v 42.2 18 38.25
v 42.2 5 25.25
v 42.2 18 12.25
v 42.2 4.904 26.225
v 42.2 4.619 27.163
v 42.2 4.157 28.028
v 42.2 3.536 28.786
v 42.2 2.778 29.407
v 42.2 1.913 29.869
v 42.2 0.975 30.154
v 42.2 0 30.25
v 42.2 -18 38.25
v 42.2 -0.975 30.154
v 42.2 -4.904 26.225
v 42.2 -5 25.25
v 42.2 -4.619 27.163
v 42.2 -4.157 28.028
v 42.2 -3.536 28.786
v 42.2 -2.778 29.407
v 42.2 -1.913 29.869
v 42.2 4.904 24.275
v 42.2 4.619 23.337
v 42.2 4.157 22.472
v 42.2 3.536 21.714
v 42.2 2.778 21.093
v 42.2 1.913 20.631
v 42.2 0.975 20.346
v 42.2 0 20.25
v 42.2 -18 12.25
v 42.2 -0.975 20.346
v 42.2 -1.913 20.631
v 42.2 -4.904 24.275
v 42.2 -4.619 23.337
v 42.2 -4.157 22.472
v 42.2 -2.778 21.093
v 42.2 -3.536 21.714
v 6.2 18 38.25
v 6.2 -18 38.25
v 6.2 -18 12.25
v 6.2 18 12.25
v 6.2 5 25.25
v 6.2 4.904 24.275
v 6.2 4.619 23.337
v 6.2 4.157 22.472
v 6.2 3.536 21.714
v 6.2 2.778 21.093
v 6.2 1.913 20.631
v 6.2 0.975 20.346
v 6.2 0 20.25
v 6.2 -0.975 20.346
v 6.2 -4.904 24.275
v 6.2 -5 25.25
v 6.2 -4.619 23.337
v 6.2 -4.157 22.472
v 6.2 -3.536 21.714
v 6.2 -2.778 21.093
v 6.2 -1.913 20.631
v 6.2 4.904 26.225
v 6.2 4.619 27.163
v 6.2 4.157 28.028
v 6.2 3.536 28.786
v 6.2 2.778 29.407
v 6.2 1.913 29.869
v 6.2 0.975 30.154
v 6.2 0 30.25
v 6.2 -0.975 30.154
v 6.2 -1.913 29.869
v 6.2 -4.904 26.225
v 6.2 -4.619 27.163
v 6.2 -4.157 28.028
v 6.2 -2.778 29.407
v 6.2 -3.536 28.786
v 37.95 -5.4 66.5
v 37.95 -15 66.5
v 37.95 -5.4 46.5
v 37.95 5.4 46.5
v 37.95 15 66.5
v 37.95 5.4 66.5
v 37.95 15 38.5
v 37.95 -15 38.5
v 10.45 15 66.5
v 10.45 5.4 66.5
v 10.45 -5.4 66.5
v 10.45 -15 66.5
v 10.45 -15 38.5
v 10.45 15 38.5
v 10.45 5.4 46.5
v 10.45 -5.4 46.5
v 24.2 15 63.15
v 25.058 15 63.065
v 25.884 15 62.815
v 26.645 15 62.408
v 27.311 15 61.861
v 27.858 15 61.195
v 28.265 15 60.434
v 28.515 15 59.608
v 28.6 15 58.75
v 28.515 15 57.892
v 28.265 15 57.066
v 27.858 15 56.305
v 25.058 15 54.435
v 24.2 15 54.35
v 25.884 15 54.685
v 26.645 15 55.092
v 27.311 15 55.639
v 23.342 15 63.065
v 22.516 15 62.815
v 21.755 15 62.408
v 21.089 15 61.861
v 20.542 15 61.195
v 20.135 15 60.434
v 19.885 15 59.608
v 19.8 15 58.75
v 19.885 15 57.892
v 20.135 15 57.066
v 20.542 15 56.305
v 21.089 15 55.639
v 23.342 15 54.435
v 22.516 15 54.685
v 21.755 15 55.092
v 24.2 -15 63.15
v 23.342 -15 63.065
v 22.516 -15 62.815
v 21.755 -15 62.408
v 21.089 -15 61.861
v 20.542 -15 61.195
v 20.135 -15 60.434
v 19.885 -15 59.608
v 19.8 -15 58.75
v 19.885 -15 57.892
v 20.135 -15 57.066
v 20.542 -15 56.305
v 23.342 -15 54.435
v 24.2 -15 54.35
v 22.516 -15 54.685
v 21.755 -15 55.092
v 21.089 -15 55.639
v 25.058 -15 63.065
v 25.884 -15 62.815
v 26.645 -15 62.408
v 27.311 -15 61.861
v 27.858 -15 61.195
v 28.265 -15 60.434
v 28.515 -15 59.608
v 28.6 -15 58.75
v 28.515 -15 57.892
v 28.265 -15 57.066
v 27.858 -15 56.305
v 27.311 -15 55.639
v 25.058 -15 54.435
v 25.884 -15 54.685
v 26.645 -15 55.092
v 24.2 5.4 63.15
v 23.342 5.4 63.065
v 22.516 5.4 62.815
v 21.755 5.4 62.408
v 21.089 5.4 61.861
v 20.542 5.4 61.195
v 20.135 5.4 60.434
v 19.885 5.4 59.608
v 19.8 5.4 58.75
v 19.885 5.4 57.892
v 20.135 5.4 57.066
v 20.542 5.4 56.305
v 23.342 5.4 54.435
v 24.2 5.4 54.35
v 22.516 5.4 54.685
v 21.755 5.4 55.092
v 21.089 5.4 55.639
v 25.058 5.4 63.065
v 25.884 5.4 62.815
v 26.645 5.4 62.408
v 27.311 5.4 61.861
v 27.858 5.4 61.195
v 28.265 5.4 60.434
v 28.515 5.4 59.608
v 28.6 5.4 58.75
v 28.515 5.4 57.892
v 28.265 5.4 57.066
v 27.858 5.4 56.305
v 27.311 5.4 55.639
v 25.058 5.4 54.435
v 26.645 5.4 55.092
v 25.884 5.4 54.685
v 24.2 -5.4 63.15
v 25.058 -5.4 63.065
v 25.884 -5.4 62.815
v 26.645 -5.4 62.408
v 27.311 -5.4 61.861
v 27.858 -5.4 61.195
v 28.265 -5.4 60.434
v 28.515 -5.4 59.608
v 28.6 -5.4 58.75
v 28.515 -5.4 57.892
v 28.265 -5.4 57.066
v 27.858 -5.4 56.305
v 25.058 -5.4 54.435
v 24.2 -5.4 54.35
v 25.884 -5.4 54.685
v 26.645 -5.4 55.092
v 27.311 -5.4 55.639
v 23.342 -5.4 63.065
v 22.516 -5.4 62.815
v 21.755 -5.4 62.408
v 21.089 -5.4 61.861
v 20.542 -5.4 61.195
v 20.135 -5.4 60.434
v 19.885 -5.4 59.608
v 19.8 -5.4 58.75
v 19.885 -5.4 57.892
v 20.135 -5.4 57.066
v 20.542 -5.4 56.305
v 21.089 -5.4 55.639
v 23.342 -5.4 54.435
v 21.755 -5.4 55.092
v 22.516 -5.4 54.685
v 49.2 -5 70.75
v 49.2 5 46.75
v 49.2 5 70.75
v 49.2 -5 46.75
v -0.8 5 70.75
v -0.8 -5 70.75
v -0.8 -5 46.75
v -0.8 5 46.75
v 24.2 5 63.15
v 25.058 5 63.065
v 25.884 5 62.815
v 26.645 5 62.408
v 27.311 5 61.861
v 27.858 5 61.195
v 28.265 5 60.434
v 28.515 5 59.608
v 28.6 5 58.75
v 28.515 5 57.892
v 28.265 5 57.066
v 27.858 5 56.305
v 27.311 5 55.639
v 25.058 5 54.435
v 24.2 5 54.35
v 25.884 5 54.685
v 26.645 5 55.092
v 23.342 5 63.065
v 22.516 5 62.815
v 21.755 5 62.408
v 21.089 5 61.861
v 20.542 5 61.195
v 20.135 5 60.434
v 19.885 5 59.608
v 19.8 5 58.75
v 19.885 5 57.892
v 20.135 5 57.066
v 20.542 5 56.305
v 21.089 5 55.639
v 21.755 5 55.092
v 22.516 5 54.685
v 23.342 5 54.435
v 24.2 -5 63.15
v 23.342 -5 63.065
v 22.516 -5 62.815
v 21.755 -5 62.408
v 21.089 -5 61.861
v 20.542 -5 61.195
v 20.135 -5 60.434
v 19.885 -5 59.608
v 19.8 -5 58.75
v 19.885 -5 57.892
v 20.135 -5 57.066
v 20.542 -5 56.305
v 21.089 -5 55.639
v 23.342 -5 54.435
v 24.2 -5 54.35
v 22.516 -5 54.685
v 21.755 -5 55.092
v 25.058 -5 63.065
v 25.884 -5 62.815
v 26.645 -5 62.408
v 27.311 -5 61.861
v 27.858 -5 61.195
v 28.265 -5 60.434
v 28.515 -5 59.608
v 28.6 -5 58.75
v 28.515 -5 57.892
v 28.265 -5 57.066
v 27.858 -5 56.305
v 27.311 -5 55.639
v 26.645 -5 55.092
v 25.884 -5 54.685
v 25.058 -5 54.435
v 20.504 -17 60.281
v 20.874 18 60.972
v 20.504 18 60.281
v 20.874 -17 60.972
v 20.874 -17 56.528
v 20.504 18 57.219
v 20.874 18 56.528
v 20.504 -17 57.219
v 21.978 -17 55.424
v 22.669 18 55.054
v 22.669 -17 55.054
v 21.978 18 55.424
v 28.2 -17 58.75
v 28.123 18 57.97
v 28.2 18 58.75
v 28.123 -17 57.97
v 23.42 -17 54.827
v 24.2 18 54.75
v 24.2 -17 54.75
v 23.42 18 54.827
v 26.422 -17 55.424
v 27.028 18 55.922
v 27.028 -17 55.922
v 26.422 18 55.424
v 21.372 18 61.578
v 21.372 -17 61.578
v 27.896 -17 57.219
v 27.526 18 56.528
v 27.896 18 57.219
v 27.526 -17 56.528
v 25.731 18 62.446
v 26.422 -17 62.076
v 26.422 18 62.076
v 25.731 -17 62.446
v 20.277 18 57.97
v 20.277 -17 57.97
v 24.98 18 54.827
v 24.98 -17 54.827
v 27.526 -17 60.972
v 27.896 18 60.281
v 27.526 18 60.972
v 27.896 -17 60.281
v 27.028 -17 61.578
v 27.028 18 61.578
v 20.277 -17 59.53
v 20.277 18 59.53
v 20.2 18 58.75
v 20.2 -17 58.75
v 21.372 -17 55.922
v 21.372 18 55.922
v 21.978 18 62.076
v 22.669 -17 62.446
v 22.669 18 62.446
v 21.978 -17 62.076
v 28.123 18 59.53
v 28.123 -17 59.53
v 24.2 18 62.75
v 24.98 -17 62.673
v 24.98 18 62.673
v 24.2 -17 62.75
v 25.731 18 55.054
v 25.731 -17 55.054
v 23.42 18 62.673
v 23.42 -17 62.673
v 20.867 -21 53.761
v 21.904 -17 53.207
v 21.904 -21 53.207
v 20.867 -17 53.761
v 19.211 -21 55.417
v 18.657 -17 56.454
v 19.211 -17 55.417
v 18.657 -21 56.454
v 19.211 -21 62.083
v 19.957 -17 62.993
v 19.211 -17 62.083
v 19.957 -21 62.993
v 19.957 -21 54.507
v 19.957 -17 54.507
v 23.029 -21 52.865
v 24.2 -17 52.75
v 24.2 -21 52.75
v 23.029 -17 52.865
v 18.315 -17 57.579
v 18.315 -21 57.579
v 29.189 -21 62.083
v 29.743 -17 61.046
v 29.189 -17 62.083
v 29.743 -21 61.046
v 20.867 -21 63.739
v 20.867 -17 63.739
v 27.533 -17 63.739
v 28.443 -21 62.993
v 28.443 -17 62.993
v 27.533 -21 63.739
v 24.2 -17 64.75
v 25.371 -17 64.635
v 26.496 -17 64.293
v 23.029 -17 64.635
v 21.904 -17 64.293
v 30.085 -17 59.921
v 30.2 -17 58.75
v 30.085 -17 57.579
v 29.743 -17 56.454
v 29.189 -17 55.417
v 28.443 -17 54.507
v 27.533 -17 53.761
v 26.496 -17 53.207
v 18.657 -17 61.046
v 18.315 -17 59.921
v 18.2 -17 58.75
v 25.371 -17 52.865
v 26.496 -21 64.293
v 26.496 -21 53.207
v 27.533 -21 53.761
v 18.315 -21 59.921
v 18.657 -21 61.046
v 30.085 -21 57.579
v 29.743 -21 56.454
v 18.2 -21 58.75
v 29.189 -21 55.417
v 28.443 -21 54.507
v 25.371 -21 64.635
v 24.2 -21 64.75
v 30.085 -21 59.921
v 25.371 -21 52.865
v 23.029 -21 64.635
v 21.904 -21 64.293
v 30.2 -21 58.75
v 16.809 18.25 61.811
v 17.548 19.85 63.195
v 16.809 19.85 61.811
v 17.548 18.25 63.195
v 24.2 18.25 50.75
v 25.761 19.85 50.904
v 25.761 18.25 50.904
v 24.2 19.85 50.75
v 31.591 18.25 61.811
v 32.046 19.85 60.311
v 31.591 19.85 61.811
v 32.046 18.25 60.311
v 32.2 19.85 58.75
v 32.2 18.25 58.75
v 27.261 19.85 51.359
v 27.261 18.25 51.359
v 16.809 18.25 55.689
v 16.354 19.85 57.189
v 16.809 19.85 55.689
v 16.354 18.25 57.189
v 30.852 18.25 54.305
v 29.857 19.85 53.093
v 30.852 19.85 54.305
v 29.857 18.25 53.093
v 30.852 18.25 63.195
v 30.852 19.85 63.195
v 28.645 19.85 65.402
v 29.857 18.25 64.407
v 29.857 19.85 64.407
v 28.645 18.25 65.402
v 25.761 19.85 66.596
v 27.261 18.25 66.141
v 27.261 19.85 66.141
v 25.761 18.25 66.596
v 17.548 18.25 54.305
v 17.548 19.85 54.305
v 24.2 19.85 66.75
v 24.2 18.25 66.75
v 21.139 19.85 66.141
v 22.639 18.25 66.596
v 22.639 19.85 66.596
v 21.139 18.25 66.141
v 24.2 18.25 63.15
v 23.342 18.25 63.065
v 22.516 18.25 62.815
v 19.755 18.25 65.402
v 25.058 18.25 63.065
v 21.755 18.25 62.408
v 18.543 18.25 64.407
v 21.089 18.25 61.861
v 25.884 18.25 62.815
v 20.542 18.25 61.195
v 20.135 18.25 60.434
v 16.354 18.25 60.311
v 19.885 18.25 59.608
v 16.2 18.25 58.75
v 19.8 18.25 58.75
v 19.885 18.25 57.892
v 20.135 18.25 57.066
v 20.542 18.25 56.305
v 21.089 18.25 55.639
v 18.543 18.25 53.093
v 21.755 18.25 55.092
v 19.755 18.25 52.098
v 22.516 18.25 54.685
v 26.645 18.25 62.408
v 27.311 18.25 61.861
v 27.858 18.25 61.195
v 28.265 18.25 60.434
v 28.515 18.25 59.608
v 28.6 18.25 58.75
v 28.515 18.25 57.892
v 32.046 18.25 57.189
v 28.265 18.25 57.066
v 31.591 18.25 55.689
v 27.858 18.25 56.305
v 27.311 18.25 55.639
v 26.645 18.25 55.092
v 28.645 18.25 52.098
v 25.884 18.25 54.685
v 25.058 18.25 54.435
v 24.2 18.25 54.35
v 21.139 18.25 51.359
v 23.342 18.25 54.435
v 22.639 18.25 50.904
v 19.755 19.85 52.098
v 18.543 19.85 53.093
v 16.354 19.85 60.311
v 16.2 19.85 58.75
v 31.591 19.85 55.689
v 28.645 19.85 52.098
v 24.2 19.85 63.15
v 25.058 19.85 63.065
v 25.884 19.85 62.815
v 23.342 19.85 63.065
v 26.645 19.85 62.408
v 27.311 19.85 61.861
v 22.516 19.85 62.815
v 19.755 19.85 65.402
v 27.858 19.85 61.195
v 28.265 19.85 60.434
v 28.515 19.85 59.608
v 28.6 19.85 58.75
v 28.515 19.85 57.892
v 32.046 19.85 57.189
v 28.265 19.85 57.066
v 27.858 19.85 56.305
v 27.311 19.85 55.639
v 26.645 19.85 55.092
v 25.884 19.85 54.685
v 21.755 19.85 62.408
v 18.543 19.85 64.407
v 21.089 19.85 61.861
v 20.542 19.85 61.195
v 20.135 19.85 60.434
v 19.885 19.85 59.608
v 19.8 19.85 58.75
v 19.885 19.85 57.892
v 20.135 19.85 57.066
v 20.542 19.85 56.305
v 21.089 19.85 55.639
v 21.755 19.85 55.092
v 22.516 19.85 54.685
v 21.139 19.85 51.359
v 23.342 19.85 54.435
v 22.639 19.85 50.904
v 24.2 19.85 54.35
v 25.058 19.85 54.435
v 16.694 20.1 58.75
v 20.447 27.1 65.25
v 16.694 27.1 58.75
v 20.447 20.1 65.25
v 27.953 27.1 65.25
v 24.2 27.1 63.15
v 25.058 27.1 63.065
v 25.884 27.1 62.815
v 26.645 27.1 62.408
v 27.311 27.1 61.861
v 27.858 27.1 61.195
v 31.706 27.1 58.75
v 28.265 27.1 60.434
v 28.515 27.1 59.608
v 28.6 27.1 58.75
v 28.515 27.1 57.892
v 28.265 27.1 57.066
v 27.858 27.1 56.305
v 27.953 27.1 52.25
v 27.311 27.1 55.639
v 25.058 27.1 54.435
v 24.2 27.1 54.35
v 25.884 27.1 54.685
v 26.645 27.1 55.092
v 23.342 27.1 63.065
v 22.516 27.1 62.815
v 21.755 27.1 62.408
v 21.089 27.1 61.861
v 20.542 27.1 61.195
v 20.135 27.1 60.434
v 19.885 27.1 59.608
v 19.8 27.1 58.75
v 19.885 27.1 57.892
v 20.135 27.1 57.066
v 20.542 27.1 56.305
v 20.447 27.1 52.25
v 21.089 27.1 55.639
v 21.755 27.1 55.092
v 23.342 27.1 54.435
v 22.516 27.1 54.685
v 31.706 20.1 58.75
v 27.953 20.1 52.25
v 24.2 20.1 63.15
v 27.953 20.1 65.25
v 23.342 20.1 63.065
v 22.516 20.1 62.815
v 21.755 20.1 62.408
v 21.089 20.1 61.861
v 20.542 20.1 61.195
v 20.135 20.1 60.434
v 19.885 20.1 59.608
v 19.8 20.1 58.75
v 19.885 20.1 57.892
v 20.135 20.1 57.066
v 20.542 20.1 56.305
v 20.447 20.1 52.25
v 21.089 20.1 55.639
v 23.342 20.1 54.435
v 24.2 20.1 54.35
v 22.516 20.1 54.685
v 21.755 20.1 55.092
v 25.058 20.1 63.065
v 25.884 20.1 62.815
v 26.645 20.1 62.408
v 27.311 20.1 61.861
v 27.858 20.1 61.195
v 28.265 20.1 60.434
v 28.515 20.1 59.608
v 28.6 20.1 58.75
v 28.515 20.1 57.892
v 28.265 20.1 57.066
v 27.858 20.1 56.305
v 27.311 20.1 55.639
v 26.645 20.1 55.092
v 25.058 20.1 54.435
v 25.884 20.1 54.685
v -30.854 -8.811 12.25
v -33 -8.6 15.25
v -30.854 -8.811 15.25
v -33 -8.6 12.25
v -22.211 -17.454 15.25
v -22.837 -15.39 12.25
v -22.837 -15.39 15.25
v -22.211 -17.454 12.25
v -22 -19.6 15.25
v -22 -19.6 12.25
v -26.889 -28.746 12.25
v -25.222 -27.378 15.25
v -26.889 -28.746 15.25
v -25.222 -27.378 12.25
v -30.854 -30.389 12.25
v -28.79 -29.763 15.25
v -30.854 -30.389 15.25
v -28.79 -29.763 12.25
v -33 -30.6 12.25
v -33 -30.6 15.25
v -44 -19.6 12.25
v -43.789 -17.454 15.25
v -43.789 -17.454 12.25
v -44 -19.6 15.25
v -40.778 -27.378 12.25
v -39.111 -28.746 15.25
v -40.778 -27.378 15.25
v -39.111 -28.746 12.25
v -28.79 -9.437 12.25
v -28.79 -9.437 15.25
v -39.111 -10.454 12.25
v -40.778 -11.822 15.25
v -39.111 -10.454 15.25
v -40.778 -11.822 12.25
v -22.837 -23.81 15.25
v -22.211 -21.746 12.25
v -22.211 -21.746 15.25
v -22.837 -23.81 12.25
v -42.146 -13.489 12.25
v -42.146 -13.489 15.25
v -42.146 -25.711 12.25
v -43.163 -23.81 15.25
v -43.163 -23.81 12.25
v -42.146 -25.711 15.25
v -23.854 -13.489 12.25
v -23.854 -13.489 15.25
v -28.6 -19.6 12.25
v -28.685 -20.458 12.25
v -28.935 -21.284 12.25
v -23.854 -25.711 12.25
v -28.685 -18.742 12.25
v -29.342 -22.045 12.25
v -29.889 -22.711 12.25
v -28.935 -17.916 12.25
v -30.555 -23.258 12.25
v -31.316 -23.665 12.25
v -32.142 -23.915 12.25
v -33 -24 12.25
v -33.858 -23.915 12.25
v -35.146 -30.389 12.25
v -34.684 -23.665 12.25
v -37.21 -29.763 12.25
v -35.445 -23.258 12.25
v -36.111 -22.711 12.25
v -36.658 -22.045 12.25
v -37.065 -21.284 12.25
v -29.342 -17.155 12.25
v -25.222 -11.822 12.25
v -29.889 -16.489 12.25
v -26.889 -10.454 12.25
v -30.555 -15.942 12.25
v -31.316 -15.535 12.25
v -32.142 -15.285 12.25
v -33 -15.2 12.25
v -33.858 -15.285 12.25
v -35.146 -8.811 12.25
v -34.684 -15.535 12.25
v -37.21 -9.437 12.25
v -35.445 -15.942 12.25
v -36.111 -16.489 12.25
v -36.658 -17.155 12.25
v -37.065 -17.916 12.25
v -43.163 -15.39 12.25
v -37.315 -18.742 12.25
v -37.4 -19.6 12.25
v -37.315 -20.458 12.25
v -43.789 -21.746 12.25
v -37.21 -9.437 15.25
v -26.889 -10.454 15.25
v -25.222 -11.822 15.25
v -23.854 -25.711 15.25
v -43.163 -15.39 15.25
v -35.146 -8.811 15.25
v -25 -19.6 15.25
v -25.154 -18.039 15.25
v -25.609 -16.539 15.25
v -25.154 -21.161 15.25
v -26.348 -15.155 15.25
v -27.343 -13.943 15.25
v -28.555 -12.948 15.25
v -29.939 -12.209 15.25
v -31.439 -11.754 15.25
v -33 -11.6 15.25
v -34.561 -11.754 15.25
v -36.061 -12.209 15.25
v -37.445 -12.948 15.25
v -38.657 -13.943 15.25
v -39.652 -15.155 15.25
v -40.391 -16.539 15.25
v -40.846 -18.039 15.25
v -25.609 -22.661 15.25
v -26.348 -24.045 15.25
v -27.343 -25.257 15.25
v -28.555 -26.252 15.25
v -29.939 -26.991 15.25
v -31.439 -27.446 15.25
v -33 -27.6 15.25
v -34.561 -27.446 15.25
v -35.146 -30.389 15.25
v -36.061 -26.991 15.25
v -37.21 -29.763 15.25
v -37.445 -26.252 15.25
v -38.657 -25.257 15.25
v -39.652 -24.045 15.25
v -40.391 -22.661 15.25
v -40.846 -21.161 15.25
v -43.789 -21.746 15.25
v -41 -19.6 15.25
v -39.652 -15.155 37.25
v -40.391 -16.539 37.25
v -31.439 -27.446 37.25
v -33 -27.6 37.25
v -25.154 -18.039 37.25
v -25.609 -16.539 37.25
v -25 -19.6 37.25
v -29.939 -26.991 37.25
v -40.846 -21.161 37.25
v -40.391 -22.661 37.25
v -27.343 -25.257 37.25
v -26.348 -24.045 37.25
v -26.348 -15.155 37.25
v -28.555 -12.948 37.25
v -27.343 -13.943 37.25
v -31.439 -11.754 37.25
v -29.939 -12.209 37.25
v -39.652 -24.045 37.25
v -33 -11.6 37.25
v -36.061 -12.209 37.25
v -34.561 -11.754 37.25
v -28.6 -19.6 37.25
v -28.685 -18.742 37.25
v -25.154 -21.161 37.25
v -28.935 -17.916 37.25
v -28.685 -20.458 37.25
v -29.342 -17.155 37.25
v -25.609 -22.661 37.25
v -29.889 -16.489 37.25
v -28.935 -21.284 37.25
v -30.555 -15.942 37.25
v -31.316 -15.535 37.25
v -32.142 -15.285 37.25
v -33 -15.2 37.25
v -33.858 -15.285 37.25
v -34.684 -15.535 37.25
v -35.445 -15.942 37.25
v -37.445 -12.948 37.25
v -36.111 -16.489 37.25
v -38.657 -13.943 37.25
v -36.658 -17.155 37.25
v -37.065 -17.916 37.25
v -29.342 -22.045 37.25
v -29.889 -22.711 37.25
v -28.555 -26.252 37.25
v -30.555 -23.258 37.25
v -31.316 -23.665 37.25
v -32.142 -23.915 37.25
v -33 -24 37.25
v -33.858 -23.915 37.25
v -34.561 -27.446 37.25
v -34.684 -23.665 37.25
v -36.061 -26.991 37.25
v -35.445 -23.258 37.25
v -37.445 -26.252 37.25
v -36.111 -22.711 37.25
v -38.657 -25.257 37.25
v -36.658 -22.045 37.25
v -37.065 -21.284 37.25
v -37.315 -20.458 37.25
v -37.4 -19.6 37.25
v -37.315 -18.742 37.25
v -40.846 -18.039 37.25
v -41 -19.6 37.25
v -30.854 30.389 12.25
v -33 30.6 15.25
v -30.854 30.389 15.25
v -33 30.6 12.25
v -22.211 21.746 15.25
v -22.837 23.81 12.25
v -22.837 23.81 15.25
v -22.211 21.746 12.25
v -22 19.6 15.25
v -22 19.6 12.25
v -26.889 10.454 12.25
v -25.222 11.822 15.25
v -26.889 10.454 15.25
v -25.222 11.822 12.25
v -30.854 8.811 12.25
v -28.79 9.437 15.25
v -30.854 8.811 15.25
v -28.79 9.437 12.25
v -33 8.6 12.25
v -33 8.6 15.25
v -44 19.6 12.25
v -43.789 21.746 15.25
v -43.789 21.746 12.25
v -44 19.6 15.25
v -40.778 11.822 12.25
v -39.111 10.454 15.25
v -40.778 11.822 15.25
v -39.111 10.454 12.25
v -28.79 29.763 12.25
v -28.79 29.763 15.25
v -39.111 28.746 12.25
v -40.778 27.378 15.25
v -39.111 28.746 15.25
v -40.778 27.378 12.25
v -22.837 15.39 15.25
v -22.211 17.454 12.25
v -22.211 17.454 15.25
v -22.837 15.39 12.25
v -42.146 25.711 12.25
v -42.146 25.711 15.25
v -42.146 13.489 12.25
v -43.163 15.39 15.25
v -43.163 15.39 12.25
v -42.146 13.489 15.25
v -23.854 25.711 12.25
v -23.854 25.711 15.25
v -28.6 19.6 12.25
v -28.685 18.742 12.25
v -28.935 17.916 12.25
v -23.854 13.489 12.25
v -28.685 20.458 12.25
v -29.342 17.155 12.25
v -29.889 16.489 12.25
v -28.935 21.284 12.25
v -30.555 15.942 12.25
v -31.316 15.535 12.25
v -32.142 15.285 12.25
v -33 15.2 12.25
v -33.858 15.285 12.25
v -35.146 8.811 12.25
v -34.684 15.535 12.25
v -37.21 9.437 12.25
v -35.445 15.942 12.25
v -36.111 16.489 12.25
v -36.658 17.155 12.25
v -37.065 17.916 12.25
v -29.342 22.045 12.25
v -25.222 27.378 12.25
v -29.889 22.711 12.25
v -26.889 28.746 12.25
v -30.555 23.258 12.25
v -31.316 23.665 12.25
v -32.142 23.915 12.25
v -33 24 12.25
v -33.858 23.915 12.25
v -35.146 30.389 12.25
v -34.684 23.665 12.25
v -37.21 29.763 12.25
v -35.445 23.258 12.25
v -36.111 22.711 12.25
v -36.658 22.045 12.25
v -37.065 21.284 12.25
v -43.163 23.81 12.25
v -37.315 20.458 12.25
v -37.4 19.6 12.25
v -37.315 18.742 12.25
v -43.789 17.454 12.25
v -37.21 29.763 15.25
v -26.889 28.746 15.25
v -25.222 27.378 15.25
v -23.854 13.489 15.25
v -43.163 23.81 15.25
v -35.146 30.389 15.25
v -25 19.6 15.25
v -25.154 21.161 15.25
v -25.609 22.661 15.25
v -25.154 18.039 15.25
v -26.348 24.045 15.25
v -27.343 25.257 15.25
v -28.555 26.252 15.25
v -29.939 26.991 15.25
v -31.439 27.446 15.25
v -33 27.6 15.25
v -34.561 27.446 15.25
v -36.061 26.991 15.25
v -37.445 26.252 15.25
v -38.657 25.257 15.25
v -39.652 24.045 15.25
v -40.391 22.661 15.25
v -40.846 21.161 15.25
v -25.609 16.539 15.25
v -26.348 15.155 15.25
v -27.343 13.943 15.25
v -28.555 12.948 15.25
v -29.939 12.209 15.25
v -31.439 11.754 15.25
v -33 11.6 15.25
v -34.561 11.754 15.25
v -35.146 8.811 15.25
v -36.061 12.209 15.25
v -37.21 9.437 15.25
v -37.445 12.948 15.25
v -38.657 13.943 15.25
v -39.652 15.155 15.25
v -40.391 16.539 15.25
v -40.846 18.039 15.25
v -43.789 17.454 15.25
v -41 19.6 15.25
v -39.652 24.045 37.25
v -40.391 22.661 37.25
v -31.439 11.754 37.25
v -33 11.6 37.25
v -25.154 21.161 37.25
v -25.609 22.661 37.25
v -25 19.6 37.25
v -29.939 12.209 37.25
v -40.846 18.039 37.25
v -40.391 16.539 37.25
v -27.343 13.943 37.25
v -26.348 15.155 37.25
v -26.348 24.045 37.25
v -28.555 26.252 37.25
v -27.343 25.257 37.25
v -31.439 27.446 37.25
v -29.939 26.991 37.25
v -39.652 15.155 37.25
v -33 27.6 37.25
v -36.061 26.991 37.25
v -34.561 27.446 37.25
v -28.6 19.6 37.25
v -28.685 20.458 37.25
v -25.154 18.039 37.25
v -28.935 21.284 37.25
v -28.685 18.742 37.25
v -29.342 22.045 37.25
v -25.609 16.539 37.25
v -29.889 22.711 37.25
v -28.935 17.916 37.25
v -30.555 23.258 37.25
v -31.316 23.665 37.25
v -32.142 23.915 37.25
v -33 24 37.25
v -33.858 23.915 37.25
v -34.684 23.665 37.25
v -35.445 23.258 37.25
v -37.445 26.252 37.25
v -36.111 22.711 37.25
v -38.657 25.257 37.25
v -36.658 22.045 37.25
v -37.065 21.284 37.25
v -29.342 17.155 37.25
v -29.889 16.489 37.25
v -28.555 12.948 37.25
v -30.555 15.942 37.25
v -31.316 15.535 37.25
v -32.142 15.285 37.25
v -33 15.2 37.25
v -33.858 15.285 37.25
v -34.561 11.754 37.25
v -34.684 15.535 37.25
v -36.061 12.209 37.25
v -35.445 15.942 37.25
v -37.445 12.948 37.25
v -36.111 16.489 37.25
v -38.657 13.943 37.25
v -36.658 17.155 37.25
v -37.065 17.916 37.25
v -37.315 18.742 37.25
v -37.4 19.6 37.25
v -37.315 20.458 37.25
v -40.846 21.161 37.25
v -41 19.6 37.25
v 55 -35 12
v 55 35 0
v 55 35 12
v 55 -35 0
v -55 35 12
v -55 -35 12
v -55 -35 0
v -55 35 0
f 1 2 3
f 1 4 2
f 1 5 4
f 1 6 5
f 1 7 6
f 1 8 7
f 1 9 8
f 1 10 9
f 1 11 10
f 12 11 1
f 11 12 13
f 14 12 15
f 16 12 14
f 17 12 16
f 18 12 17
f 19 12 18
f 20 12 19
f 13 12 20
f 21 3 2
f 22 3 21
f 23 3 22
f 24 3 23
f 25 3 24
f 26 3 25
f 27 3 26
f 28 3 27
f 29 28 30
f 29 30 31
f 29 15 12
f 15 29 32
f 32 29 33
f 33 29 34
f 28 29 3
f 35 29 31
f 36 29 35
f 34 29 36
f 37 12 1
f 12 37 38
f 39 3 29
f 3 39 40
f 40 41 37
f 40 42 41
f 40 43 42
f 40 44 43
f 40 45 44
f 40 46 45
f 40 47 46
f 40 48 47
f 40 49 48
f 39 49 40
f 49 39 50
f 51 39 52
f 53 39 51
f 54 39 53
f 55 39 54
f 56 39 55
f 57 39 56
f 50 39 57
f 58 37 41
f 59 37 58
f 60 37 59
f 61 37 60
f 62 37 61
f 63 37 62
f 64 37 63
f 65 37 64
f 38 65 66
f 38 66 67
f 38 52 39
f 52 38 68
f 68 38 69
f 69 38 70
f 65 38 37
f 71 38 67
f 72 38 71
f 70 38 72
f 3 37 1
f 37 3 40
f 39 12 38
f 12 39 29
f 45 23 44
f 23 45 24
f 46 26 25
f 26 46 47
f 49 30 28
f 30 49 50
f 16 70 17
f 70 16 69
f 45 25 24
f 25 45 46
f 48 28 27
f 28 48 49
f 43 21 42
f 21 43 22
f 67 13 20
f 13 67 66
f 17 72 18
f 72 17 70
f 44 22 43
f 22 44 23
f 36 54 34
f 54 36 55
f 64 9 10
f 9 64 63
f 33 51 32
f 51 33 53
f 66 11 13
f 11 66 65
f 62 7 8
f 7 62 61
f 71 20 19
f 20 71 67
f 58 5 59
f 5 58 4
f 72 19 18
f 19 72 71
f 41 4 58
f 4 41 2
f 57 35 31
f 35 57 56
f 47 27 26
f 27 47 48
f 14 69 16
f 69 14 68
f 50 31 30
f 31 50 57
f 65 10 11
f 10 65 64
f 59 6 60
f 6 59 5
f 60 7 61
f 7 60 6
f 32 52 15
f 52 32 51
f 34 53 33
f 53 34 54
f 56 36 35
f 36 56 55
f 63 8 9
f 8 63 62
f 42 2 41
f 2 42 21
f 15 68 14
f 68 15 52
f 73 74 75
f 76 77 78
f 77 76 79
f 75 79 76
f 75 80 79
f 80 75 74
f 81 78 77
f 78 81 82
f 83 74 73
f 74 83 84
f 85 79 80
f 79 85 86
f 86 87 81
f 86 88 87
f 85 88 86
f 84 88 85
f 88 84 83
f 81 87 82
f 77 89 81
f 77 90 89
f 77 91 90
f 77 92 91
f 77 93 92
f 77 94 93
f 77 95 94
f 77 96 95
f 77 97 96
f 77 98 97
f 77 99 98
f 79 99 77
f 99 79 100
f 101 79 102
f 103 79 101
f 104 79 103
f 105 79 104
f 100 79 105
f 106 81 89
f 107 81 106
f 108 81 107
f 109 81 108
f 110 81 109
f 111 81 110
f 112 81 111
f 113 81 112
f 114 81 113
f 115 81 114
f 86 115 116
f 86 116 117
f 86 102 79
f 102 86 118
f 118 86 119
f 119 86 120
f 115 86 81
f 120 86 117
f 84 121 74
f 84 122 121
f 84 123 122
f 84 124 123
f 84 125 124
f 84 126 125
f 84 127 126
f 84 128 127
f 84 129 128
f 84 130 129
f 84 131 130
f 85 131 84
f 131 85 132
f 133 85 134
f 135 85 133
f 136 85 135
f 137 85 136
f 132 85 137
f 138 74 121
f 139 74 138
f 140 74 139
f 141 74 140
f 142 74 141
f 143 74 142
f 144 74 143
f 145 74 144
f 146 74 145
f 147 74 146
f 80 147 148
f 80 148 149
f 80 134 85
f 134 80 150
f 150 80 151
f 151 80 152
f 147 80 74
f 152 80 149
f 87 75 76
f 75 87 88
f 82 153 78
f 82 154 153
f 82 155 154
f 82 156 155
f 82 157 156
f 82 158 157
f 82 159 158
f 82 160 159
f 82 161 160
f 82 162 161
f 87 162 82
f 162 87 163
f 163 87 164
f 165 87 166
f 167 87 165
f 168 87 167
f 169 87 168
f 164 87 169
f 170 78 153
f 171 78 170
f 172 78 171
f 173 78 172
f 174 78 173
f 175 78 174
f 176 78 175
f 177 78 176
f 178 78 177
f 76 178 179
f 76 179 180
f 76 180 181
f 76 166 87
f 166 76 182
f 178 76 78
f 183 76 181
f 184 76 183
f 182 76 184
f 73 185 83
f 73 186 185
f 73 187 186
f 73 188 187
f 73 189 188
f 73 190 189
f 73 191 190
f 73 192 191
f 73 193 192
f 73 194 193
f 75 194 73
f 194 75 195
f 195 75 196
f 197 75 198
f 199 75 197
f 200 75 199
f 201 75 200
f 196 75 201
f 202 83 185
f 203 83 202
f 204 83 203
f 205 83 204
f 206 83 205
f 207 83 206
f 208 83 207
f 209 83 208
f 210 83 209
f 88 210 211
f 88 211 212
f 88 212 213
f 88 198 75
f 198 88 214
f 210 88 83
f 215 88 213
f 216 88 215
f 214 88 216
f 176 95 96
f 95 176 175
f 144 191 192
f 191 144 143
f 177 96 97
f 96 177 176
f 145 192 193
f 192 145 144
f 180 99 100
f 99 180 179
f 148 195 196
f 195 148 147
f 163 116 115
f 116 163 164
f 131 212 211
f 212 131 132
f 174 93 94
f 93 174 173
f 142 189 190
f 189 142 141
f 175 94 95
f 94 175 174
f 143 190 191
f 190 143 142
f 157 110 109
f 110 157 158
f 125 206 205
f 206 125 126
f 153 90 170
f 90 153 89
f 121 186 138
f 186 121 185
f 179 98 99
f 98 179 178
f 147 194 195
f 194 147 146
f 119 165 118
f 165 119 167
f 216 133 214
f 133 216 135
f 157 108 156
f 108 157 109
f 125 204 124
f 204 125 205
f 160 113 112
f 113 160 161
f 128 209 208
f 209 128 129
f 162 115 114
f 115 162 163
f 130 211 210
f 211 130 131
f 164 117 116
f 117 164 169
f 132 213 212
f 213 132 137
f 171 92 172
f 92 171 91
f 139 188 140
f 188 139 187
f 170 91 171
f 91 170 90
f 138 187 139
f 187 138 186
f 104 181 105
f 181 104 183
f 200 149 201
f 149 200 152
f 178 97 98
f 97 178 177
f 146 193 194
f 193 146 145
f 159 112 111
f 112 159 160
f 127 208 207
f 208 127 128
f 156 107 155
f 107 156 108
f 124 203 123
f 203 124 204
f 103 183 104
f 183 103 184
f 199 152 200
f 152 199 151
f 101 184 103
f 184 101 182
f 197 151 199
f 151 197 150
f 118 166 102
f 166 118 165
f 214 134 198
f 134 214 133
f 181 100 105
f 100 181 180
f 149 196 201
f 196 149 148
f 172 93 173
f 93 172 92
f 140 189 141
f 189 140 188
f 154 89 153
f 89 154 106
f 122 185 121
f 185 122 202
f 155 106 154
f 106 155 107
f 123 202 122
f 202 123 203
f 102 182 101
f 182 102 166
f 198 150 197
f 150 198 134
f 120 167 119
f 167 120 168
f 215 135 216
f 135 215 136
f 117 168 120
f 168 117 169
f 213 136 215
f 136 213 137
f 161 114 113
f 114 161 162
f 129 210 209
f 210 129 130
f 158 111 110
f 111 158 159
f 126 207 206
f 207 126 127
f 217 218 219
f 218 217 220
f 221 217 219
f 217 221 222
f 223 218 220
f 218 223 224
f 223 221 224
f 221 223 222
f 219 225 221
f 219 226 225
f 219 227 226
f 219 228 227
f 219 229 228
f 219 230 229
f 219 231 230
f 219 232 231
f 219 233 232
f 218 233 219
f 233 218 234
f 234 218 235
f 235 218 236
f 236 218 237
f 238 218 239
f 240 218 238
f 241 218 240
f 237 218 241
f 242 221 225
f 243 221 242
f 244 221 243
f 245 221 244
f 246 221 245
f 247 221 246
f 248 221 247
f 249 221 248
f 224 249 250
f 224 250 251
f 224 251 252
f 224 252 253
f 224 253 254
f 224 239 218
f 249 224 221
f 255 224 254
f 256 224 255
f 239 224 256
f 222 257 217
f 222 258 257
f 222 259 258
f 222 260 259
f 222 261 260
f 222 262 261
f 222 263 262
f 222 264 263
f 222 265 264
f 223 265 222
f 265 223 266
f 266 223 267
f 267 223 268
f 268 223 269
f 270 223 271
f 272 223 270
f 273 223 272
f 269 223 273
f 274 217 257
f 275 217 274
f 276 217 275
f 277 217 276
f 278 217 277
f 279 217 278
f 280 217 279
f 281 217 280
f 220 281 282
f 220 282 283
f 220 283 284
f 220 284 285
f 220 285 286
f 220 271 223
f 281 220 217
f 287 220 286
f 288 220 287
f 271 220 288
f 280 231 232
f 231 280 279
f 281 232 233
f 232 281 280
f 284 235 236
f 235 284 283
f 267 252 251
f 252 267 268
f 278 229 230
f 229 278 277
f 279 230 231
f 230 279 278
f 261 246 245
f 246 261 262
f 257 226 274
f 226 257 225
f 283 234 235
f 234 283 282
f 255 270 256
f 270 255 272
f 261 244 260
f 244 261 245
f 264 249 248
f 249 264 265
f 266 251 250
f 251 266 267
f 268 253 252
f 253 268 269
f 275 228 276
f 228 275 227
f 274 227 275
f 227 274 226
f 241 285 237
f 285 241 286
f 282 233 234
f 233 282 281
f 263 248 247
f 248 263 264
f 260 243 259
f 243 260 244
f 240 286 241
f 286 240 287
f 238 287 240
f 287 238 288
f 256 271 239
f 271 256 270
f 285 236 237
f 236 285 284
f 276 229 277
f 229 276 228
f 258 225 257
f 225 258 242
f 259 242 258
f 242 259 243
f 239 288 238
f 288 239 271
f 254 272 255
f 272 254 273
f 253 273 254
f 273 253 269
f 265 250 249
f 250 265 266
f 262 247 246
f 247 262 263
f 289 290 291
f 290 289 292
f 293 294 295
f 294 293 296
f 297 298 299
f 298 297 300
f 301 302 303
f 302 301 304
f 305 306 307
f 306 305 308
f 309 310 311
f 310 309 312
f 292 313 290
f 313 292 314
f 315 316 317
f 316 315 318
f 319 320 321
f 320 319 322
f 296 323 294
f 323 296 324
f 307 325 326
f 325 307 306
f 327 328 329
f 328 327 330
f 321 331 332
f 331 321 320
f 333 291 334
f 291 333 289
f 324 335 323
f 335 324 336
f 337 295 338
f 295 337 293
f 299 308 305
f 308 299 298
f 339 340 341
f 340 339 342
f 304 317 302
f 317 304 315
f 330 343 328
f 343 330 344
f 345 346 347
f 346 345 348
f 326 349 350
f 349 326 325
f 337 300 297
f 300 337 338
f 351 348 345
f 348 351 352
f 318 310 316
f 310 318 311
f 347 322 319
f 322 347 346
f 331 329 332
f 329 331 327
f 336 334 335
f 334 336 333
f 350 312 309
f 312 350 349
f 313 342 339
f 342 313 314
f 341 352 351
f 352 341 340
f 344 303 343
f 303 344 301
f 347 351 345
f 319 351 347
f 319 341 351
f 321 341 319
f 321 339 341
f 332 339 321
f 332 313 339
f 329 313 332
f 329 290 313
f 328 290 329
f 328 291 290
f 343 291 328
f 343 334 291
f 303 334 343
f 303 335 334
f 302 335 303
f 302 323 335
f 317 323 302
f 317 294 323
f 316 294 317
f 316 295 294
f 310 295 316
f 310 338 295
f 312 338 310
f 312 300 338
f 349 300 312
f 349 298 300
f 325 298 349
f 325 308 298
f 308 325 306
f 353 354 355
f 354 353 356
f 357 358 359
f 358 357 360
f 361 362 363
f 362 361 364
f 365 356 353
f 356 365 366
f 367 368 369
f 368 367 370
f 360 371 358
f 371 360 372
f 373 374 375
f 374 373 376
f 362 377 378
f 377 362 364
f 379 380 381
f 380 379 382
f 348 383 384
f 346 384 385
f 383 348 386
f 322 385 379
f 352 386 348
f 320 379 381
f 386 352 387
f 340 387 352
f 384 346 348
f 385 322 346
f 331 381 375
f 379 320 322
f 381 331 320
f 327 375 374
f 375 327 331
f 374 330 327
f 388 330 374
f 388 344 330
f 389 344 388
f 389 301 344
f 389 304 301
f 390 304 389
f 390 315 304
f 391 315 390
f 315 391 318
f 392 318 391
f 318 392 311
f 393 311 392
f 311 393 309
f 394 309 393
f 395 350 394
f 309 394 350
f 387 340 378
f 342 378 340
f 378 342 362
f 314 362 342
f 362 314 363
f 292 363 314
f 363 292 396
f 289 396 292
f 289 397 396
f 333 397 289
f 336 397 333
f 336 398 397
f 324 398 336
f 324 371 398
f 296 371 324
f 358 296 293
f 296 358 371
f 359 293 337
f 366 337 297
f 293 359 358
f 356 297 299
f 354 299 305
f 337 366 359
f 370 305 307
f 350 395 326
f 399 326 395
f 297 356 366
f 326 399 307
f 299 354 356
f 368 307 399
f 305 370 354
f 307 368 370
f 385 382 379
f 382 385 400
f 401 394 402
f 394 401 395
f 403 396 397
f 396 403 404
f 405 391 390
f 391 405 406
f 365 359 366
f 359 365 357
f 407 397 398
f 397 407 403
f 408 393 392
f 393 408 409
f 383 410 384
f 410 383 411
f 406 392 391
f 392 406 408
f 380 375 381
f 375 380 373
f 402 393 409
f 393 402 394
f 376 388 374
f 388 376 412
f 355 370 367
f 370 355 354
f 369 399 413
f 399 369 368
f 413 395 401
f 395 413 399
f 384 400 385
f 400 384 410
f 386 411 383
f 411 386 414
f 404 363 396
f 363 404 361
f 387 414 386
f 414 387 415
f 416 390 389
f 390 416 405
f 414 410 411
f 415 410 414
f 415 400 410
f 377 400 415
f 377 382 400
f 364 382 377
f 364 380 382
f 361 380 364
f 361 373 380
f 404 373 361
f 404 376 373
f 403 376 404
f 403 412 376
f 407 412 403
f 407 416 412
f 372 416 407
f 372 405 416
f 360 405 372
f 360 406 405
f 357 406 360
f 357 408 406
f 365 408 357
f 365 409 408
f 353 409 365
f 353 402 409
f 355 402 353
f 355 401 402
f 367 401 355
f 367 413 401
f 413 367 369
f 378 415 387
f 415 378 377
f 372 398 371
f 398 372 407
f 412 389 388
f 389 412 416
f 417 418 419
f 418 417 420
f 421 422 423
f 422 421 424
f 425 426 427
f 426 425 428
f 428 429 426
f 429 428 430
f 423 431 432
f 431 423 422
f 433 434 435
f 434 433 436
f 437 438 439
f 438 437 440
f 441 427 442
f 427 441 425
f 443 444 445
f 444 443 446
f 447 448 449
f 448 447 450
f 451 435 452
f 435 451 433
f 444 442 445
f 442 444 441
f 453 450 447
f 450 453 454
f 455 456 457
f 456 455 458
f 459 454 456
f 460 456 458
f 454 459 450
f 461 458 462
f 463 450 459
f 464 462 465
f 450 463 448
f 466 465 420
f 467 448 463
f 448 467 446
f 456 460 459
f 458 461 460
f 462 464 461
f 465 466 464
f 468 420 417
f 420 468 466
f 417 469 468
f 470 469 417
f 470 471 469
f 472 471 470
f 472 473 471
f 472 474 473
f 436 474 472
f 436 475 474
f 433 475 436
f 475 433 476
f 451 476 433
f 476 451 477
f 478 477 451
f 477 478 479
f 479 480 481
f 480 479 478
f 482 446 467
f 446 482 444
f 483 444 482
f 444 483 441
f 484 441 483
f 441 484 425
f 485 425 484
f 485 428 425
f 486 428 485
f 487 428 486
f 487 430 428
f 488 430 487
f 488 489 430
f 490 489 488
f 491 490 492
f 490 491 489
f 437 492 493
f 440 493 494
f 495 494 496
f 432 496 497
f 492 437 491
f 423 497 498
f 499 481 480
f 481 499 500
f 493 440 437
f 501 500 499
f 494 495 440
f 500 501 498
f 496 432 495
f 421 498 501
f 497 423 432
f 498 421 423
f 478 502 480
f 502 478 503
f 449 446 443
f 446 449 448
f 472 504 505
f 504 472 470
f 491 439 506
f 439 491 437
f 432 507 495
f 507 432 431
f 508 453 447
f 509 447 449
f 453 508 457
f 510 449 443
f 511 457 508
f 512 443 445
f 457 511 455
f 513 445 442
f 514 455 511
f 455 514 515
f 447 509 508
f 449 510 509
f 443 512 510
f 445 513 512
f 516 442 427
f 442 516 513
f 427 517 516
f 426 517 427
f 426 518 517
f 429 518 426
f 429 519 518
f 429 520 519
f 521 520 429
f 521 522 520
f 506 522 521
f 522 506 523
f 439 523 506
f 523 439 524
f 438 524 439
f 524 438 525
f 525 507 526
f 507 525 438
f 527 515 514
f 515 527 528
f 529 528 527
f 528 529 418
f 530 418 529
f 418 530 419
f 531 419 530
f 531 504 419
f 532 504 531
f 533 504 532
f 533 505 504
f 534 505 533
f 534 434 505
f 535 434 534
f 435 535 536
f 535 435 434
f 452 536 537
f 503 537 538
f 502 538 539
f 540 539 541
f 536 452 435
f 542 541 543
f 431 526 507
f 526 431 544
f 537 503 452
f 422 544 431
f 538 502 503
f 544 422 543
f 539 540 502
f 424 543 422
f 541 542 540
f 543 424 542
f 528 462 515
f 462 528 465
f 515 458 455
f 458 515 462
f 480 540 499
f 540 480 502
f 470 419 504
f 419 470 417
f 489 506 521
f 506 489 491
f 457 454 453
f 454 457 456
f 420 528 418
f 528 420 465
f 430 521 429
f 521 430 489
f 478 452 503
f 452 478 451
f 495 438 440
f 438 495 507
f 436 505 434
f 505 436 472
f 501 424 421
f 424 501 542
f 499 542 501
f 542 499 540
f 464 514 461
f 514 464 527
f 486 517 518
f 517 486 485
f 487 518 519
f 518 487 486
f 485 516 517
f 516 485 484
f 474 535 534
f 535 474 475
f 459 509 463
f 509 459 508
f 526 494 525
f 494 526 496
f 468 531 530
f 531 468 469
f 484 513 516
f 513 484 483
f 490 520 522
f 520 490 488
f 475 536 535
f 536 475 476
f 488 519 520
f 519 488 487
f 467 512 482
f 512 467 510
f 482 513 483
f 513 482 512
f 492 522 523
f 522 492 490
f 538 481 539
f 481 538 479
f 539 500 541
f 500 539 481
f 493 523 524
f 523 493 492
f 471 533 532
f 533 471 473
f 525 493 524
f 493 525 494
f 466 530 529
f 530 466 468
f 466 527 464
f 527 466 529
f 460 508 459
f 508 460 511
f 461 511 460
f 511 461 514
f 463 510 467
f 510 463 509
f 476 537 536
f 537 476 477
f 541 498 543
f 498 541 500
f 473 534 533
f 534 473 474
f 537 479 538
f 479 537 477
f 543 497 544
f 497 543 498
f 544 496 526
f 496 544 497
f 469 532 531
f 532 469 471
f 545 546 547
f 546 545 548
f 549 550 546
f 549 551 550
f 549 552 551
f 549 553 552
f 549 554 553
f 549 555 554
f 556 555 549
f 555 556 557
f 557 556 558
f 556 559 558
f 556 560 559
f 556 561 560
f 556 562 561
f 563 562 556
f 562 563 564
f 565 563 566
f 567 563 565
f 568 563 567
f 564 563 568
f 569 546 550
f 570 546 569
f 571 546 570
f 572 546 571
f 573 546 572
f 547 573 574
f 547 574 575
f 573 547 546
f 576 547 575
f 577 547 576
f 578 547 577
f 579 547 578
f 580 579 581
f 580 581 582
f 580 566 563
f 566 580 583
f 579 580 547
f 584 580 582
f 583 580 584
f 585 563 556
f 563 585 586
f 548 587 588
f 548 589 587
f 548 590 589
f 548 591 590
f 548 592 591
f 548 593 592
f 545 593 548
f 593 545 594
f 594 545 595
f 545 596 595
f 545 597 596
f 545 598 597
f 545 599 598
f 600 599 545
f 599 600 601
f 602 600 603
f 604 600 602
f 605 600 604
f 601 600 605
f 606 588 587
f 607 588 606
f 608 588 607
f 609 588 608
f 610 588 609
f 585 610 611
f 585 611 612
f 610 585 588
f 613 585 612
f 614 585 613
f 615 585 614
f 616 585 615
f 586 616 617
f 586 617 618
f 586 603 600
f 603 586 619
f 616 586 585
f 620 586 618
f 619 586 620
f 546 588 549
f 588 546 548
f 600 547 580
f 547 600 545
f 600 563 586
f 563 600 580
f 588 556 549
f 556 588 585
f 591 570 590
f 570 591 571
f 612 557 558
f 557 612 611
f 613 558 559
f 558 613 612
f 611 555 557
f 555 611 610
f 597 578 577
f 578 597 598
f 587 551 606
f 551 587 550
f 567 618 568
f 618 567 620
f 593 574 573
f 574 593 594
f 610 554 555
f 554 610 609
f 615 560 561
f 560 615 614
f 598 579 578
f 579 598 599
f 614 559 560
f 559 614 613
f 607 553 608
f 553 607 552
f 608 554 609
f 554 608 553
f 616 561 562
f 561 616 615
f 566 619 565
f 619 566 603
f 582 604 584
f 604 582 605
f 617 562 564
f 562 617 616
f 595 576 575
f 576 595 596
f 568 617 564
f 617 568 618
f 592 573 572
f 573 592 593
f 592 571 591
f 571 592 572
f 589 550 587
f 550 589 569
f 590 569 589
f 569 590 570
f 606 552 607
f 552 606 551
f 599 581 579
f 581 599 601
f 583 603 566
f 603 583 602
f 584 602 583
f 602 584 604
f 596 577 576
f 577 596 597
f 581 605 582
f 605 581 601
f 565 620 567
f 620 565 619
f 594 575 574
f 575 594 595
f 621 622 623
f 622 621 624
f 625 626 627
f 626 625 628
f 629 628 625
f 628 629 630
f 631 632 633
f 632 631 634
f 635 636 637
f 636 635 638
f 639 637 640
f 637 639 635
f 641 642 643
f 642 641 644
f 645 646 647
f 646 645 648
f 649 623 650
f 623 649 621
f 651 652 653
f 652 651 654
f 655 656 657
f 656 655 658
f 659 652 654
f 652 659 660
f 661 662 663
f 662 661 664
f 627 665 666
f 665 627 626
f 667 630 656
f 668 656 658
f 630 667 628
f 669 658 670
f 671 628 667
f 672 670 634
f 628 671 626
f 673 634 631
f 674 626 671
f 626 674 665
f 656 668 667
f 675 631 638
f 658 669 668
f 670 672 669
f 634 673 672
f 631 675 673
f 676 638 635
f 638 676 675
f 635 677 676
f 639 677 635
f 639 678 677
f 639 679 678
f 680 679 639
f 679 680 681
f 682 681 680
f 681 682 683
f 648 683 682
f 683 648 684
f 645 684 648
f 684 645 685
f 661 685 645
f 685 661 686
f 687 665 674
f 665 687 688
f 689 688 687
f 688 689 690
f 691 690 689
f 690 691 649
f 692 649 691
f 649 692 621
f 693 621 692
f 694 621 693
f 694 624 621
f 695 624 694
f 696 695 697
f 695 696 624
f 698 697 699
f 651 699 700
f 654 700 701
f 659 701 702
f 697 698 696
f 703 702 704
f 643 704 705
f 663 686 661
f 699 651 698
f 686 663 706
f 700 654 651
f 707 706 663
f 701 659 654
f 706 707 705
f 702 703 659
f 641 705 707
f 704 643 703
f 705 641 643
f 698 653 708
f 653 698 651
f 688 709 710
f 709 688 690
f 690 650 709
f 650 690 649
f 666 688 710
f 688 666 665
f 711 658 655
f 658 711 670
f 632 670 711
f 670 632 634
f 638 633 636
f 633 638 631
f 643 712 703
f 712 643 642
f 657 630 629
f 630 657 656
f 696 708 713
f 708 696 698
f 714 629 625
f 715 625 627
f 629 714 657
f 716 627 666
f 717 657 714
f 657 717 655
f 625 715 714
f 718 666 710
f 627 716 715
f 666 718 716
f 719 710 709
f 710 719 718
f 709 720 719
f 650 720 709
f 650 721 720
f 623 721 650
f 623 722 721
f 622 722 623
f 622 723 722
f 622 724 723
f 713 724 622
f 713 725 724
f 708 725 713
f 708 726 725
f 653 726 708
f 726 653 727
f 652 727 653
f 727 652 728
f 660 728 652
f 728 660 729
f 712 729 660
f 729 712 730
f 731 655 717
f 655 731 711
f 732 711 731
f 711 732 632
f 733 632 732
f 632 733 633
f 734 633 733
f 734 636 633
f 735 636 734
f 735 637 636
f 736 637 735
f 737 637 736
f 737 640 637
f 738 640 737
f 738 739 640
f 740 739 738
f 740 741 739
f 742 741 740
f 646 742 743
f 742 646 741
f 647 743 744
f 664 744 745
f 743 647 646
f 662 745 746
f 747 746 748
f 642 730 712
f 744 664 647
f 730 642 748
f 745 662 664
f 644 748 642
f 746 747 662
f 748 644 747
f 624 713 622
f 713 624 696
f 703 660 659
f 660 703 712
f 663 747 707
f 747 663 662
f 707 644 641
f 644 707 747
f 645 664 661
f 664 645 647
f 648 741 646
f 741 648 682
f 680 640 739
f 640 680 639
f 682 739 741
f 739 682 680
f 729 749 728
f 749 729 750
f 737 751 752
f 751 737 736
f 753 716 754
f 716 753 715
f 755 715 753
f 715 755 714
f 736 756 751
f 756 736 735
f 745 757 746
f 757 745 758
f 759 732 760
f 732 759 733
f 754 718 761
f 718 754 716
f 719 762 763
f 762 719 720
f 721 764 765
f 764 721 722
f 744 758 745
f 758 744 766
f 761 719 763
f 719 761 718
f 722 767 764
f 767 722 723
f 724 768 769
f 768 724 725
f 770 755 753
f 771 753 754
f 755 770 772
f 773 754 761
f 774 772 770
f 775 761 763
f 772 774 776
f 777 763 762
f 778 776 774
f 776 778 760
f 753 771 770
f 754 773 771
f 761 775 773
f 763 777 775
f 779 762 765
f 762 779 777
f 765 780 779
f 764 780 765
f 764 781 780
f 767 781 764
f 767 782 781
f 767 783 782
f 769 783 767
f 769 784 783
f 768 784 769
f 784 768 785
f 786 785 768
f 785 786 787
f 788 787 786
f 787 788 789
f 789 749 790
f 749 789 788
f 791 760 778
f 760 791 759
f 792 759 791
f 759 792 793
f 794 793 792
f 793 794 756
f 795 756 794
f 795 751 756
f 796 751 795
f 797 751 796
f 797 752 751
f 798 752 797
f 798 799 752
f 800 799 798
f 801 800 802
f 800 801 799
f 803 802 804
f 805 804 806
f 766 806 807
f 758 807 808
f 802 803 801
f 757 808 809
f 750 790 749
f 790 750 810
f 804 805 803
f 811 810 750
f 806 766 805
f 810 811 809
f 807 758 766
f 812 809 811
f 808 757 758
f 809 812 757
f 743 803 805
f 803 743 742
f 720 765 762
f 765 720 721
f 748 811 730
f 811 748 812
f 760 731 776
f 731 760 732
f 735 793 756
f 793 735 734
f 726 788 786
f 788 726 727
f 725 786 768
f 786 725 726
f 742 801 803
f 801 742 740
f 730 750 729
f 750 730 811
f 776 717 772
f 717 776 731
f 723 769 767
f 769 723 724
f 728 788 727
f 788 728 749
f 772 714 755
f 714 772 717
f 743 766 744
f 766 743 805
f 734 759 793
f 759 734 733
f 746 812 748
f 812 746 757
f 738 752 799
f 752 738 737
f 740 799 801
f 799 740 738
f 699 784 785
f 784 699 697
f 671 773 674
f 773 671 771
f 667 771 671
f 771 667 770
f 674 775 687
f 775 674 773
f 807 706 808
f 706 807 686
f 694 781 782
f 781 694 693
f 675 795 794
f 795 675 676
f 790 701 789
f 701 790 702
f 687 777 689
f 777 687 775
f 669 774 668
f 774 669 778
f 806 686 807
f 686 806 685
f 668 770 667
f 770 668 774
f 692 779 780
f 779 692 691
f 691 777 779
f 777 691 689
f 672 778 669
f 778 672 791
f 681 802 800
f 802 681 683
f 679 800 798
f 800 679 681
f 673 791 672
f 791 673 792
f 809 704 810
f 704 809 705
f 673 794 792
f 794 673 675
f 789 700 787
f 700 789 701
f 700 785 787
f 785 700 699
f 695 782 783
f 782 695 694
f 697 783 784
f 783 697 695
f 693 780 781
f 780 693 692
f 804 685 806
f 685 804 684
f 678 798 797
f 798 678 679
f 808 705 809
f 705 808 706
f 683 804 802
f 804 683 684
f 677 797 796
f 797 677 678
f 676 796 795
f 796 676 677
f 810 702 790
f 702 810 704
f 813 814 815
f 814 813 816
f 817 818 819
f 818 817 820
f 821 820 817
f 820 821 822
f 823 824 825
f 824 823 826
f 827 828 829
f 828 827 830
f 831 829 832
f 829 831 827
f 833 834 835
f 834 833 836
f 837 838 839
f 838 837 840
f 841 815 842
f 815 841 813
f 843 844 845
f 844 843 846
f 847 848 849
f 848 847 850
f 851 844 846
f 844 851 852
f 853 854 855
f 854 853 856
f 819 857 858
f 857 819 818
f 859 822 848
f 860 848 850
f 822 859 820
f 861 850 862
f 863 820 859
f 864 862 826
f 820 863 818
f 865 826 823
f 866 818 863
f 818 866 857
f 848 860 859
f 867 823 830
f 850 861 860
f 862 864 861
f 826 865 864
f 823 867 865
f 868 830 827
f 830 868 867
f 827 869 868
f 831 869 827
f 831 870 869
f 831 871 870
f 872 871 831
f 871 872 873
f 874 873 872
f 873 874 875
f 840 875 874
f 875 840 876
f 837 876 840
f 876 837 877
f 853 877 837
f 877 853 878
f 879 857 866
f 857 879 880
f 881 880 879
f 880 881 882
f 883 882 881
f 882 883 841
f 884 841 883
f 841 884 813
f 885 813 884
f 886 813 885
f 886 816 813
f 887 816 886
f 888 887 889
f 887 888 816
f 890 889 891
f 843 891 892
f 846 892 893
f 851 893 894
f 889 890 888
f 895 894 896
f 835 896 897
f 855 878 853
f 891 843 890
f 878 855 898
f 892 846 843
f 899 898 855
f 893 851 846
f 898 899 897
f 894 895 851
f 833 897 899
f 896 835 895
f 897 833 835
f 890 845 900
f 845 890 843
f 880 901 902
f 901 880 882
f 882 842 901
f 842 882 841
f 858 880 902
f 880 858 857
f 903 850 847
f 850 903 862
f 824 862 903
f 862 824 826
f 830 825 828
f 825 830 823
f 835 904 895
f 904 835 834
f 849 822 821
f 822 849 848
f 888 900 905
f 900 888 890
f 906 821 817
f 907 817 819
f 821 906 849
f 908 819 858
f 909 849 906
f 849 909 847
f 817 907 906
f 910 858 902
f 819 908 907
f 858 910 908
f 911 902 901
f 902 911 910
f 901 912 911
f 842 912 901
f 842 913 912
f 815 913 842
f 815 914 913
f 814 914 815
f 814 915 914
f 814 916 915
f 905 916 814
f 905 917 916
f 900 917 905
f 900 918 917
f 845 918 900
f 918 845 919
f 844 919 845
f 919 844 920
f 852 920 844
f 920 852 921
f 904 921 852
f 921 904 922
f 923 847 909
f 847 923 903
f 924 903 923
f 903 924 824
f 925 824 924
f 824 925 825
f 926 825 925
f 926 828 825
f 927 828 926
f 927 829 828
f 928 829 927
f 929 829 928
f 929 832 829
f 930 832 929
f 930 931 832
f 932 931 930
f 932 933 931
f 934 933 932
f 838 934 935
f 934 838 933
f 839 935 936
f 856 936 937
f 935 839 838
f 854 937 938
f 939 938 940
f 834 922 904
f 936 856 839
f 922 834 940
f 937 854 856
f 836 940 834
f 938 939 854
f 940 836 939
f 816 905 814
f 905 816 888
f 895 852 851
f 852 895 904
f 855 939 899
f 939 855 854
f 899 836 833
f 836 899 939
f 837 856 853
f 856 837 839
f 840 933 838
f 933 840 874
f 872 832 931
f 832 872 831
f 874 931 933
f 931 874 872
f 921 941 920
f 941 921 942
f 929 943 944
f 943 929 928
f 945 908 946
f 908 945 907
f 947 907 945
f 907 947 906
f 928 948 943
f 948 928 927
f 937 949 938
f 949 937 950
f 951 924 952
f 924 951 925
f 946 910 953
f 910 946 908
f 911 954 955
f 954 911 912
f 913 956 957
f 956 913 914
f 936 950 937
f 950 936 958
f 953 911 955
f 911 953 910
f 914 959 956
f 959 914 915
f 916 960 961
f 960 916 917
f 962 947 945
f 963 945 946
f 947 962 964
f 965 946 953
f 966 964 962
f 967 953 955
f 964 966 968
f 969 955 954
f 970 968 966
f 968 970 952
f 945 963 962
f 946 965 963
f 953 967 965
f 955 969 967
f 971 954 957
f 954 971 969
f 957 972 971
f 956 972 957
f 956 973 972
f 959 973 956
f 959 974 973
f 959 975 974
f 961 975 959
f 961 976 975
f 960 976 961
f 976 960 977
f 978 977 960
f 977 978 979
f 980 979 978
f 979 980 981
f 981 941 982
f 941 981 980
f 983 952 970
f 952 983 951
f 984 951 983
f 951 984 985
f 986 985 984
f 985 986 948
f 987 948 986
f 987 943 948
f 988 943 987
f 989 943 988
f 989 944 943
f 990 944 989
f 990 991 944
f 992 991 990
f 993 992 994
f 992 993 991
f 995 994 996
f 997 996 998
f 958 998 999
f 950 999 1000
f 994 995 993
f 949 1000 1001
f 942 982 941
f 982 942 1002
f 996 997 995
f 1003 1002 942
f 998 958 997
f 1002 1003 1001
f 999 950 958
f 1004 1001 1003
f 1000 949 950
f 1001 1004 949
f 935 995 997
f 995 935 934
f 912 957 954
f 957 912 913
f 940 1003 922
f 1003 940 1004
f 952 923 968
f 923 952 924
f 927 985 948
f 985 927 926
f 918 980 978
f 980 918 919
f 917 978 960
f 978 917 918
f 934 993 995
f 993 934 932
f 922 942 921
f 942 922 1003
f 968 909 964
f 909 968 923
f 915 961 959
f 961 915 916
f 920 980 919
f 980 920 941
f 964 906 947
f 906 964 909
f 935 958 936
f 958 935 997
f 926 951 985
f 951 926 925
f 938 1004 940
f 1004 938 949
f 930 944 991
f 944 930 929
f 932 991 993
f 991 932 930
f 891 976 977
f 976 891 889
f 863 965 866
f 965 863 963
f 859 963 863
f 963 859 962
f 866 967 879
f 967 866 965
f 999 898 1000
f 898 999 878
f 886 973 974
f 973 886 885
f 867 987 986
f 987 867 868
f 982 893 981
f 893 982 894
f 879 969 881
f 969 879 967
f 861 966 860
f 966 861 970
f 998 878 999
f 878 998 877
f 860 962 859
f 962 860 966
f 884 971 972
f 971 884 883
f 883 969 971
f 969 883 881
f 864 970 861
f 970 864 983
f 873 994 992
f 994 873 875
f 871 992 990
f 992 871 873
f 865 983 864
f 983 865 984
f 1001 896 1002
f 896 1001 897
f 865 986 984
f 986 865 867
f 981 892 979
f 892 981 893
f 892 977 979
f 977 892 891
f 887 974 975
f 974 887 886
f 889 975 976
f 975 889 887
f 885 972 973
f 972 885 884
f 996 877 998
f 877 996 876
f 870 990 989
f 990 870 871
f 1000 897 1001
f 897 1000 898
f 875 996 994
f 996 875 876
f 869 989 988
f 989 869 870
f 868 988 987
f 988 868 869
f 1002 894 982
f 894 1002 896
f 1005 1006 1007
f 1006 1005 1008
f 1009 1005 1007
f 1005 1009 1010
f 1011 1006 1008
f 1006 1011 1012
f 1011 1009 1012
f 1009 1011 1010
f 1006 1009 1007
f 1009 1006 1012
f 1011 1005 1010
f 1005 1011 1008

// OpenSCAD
$fn = 32;

// ------------------------------------------------------------------------
// Indexing jig: plate 110 x 70 mm, pin d8
// Every part is its own module, assembly() places every instance.
// ------------------------------------------------------------------------

// --- part 1 ---
module jig_plate() {
  difference() {
    translate([-55, -35, 0]) cube([110, 70, 12]);
  }
}

// --- part 2 ---
module locator_block() {
  difference() {
    translate([-18, -18, 0]) cube([36, 36, 26]);
    translate([0, 0, 13]) rotate([0, 90, 0]) cylinder(h = 38, d = 10, center = true);
  }
}

// --- part 3 ---
module index_fork() {
  difference() {
    translate([-13.75, -15, 0]) cube([27.5, 30, 28]);
    translate([-14.75, -5.4, 8]) cube([29.5, 10.8, 21]);
    translate([0, 0, 20.25]) rotate([90, 0, 0]) cylinder(h = 32, d = 8.8, center = true);
  }
}

// --- part 4 ---
module index_arm() {
  difference() {
    translate([-25, -5, 0]) cube([50, 10, 24]);
    translate([0, 0, 12]) rotate([90, 0, 0]) cylinder(h = 12, d = 8.8, center = true);
  }
}

// --- part 5 ---
module index_pin() {
  rotate([0, 90, 0]) cylinder(h = 36, d = 8, center = true);
  translate([-21, 0, 0]) rotate([0, 90, 0]) cylinder(h = 4, d = 12);
}

// --- part 6 ---
module pin_washer() {
  difference() {
      translate([0, 0, 0]) cylinder(h = 1.6, d = 16);
      translate([0, 0, -1]) cylinder(h = 3.6, d = 8.8);
    }
}

// --- part 7 ---
module lock_nut() {
  difference() {
    linear_extrude(height = 7) polygon(points = [[7.506, 0], [3.753, 6.5], [-3.753, 6.5], [-7.506, 0], [-3.753, -6.5], [3.753, -6.5]]);
    translate([0, 0, -1]) cylinder(h = 9, d = 8.8);
  }
}

// --- part 8 ---
module guide_bush_a() {
  difference() {
    union() {
      cylinder(h = 3, d = 22);
      translate([0, 0, 3]) cylinder(h = 22, d = 16);
    }
    translate([0, 0, -1]) cylinder(h = 27, d = 8.8);
  }
}

// --- part 9 ---
module guide_bush_b() {
  difference() {
    union() {
      cylinder(h = 3, d = 22);
      translate([0, 0, 3]) cylinder(h = 22, d = 16);
    }
    translate([0, 0, -1]) cylinder(h = 27, d = 8.8);
  }
}

// --- assembly ---
module assembly() {
  color([0.80, 0.24, 0.20]) translate([0, 0, 0]) rotate([0, 0, 0]) jig_plate();
  color([0.20, 0.45, 0.75]) translate([24.2, 0, 12.25]) rotate([0, 0, 0]) locator_block();
  color([0.25, 0.62, 0.32]) translate([24.2, 0, 38.5]) rotate([0, 0, 0]) index_fork();
  color([0.92, 0.70, 0.18]) translate([24.2, 0, 46.75]) rotate([0, 0, 0]) index_arm();
  color([0.58, 0.35, 0.70]) translate([24.2, 0, 58.75]) rotate([0, 0, 90]) index_pin();
  color([0.16, 0.66, 0.66]) translate([24.2, 19.85, 58.75]) rotate([90, 0, 0]) pin_washer();
  color([0.85, 0.48, 0.18]) translate([24.2, 27.1, 58.75]) rotate([90, 0, 0]) lock_nut();
  color([0.55, 0.60, 0.65]) translate([-33, -19.6, 12.25]) rotate([0, 0, 0]) guide_bush_a();
  color([0.75, 0.30, 0.55]) translate([-33, 19.6, 12.25]) rotate([0, 0, 0]) guide_bush_b();
}

assembly();
